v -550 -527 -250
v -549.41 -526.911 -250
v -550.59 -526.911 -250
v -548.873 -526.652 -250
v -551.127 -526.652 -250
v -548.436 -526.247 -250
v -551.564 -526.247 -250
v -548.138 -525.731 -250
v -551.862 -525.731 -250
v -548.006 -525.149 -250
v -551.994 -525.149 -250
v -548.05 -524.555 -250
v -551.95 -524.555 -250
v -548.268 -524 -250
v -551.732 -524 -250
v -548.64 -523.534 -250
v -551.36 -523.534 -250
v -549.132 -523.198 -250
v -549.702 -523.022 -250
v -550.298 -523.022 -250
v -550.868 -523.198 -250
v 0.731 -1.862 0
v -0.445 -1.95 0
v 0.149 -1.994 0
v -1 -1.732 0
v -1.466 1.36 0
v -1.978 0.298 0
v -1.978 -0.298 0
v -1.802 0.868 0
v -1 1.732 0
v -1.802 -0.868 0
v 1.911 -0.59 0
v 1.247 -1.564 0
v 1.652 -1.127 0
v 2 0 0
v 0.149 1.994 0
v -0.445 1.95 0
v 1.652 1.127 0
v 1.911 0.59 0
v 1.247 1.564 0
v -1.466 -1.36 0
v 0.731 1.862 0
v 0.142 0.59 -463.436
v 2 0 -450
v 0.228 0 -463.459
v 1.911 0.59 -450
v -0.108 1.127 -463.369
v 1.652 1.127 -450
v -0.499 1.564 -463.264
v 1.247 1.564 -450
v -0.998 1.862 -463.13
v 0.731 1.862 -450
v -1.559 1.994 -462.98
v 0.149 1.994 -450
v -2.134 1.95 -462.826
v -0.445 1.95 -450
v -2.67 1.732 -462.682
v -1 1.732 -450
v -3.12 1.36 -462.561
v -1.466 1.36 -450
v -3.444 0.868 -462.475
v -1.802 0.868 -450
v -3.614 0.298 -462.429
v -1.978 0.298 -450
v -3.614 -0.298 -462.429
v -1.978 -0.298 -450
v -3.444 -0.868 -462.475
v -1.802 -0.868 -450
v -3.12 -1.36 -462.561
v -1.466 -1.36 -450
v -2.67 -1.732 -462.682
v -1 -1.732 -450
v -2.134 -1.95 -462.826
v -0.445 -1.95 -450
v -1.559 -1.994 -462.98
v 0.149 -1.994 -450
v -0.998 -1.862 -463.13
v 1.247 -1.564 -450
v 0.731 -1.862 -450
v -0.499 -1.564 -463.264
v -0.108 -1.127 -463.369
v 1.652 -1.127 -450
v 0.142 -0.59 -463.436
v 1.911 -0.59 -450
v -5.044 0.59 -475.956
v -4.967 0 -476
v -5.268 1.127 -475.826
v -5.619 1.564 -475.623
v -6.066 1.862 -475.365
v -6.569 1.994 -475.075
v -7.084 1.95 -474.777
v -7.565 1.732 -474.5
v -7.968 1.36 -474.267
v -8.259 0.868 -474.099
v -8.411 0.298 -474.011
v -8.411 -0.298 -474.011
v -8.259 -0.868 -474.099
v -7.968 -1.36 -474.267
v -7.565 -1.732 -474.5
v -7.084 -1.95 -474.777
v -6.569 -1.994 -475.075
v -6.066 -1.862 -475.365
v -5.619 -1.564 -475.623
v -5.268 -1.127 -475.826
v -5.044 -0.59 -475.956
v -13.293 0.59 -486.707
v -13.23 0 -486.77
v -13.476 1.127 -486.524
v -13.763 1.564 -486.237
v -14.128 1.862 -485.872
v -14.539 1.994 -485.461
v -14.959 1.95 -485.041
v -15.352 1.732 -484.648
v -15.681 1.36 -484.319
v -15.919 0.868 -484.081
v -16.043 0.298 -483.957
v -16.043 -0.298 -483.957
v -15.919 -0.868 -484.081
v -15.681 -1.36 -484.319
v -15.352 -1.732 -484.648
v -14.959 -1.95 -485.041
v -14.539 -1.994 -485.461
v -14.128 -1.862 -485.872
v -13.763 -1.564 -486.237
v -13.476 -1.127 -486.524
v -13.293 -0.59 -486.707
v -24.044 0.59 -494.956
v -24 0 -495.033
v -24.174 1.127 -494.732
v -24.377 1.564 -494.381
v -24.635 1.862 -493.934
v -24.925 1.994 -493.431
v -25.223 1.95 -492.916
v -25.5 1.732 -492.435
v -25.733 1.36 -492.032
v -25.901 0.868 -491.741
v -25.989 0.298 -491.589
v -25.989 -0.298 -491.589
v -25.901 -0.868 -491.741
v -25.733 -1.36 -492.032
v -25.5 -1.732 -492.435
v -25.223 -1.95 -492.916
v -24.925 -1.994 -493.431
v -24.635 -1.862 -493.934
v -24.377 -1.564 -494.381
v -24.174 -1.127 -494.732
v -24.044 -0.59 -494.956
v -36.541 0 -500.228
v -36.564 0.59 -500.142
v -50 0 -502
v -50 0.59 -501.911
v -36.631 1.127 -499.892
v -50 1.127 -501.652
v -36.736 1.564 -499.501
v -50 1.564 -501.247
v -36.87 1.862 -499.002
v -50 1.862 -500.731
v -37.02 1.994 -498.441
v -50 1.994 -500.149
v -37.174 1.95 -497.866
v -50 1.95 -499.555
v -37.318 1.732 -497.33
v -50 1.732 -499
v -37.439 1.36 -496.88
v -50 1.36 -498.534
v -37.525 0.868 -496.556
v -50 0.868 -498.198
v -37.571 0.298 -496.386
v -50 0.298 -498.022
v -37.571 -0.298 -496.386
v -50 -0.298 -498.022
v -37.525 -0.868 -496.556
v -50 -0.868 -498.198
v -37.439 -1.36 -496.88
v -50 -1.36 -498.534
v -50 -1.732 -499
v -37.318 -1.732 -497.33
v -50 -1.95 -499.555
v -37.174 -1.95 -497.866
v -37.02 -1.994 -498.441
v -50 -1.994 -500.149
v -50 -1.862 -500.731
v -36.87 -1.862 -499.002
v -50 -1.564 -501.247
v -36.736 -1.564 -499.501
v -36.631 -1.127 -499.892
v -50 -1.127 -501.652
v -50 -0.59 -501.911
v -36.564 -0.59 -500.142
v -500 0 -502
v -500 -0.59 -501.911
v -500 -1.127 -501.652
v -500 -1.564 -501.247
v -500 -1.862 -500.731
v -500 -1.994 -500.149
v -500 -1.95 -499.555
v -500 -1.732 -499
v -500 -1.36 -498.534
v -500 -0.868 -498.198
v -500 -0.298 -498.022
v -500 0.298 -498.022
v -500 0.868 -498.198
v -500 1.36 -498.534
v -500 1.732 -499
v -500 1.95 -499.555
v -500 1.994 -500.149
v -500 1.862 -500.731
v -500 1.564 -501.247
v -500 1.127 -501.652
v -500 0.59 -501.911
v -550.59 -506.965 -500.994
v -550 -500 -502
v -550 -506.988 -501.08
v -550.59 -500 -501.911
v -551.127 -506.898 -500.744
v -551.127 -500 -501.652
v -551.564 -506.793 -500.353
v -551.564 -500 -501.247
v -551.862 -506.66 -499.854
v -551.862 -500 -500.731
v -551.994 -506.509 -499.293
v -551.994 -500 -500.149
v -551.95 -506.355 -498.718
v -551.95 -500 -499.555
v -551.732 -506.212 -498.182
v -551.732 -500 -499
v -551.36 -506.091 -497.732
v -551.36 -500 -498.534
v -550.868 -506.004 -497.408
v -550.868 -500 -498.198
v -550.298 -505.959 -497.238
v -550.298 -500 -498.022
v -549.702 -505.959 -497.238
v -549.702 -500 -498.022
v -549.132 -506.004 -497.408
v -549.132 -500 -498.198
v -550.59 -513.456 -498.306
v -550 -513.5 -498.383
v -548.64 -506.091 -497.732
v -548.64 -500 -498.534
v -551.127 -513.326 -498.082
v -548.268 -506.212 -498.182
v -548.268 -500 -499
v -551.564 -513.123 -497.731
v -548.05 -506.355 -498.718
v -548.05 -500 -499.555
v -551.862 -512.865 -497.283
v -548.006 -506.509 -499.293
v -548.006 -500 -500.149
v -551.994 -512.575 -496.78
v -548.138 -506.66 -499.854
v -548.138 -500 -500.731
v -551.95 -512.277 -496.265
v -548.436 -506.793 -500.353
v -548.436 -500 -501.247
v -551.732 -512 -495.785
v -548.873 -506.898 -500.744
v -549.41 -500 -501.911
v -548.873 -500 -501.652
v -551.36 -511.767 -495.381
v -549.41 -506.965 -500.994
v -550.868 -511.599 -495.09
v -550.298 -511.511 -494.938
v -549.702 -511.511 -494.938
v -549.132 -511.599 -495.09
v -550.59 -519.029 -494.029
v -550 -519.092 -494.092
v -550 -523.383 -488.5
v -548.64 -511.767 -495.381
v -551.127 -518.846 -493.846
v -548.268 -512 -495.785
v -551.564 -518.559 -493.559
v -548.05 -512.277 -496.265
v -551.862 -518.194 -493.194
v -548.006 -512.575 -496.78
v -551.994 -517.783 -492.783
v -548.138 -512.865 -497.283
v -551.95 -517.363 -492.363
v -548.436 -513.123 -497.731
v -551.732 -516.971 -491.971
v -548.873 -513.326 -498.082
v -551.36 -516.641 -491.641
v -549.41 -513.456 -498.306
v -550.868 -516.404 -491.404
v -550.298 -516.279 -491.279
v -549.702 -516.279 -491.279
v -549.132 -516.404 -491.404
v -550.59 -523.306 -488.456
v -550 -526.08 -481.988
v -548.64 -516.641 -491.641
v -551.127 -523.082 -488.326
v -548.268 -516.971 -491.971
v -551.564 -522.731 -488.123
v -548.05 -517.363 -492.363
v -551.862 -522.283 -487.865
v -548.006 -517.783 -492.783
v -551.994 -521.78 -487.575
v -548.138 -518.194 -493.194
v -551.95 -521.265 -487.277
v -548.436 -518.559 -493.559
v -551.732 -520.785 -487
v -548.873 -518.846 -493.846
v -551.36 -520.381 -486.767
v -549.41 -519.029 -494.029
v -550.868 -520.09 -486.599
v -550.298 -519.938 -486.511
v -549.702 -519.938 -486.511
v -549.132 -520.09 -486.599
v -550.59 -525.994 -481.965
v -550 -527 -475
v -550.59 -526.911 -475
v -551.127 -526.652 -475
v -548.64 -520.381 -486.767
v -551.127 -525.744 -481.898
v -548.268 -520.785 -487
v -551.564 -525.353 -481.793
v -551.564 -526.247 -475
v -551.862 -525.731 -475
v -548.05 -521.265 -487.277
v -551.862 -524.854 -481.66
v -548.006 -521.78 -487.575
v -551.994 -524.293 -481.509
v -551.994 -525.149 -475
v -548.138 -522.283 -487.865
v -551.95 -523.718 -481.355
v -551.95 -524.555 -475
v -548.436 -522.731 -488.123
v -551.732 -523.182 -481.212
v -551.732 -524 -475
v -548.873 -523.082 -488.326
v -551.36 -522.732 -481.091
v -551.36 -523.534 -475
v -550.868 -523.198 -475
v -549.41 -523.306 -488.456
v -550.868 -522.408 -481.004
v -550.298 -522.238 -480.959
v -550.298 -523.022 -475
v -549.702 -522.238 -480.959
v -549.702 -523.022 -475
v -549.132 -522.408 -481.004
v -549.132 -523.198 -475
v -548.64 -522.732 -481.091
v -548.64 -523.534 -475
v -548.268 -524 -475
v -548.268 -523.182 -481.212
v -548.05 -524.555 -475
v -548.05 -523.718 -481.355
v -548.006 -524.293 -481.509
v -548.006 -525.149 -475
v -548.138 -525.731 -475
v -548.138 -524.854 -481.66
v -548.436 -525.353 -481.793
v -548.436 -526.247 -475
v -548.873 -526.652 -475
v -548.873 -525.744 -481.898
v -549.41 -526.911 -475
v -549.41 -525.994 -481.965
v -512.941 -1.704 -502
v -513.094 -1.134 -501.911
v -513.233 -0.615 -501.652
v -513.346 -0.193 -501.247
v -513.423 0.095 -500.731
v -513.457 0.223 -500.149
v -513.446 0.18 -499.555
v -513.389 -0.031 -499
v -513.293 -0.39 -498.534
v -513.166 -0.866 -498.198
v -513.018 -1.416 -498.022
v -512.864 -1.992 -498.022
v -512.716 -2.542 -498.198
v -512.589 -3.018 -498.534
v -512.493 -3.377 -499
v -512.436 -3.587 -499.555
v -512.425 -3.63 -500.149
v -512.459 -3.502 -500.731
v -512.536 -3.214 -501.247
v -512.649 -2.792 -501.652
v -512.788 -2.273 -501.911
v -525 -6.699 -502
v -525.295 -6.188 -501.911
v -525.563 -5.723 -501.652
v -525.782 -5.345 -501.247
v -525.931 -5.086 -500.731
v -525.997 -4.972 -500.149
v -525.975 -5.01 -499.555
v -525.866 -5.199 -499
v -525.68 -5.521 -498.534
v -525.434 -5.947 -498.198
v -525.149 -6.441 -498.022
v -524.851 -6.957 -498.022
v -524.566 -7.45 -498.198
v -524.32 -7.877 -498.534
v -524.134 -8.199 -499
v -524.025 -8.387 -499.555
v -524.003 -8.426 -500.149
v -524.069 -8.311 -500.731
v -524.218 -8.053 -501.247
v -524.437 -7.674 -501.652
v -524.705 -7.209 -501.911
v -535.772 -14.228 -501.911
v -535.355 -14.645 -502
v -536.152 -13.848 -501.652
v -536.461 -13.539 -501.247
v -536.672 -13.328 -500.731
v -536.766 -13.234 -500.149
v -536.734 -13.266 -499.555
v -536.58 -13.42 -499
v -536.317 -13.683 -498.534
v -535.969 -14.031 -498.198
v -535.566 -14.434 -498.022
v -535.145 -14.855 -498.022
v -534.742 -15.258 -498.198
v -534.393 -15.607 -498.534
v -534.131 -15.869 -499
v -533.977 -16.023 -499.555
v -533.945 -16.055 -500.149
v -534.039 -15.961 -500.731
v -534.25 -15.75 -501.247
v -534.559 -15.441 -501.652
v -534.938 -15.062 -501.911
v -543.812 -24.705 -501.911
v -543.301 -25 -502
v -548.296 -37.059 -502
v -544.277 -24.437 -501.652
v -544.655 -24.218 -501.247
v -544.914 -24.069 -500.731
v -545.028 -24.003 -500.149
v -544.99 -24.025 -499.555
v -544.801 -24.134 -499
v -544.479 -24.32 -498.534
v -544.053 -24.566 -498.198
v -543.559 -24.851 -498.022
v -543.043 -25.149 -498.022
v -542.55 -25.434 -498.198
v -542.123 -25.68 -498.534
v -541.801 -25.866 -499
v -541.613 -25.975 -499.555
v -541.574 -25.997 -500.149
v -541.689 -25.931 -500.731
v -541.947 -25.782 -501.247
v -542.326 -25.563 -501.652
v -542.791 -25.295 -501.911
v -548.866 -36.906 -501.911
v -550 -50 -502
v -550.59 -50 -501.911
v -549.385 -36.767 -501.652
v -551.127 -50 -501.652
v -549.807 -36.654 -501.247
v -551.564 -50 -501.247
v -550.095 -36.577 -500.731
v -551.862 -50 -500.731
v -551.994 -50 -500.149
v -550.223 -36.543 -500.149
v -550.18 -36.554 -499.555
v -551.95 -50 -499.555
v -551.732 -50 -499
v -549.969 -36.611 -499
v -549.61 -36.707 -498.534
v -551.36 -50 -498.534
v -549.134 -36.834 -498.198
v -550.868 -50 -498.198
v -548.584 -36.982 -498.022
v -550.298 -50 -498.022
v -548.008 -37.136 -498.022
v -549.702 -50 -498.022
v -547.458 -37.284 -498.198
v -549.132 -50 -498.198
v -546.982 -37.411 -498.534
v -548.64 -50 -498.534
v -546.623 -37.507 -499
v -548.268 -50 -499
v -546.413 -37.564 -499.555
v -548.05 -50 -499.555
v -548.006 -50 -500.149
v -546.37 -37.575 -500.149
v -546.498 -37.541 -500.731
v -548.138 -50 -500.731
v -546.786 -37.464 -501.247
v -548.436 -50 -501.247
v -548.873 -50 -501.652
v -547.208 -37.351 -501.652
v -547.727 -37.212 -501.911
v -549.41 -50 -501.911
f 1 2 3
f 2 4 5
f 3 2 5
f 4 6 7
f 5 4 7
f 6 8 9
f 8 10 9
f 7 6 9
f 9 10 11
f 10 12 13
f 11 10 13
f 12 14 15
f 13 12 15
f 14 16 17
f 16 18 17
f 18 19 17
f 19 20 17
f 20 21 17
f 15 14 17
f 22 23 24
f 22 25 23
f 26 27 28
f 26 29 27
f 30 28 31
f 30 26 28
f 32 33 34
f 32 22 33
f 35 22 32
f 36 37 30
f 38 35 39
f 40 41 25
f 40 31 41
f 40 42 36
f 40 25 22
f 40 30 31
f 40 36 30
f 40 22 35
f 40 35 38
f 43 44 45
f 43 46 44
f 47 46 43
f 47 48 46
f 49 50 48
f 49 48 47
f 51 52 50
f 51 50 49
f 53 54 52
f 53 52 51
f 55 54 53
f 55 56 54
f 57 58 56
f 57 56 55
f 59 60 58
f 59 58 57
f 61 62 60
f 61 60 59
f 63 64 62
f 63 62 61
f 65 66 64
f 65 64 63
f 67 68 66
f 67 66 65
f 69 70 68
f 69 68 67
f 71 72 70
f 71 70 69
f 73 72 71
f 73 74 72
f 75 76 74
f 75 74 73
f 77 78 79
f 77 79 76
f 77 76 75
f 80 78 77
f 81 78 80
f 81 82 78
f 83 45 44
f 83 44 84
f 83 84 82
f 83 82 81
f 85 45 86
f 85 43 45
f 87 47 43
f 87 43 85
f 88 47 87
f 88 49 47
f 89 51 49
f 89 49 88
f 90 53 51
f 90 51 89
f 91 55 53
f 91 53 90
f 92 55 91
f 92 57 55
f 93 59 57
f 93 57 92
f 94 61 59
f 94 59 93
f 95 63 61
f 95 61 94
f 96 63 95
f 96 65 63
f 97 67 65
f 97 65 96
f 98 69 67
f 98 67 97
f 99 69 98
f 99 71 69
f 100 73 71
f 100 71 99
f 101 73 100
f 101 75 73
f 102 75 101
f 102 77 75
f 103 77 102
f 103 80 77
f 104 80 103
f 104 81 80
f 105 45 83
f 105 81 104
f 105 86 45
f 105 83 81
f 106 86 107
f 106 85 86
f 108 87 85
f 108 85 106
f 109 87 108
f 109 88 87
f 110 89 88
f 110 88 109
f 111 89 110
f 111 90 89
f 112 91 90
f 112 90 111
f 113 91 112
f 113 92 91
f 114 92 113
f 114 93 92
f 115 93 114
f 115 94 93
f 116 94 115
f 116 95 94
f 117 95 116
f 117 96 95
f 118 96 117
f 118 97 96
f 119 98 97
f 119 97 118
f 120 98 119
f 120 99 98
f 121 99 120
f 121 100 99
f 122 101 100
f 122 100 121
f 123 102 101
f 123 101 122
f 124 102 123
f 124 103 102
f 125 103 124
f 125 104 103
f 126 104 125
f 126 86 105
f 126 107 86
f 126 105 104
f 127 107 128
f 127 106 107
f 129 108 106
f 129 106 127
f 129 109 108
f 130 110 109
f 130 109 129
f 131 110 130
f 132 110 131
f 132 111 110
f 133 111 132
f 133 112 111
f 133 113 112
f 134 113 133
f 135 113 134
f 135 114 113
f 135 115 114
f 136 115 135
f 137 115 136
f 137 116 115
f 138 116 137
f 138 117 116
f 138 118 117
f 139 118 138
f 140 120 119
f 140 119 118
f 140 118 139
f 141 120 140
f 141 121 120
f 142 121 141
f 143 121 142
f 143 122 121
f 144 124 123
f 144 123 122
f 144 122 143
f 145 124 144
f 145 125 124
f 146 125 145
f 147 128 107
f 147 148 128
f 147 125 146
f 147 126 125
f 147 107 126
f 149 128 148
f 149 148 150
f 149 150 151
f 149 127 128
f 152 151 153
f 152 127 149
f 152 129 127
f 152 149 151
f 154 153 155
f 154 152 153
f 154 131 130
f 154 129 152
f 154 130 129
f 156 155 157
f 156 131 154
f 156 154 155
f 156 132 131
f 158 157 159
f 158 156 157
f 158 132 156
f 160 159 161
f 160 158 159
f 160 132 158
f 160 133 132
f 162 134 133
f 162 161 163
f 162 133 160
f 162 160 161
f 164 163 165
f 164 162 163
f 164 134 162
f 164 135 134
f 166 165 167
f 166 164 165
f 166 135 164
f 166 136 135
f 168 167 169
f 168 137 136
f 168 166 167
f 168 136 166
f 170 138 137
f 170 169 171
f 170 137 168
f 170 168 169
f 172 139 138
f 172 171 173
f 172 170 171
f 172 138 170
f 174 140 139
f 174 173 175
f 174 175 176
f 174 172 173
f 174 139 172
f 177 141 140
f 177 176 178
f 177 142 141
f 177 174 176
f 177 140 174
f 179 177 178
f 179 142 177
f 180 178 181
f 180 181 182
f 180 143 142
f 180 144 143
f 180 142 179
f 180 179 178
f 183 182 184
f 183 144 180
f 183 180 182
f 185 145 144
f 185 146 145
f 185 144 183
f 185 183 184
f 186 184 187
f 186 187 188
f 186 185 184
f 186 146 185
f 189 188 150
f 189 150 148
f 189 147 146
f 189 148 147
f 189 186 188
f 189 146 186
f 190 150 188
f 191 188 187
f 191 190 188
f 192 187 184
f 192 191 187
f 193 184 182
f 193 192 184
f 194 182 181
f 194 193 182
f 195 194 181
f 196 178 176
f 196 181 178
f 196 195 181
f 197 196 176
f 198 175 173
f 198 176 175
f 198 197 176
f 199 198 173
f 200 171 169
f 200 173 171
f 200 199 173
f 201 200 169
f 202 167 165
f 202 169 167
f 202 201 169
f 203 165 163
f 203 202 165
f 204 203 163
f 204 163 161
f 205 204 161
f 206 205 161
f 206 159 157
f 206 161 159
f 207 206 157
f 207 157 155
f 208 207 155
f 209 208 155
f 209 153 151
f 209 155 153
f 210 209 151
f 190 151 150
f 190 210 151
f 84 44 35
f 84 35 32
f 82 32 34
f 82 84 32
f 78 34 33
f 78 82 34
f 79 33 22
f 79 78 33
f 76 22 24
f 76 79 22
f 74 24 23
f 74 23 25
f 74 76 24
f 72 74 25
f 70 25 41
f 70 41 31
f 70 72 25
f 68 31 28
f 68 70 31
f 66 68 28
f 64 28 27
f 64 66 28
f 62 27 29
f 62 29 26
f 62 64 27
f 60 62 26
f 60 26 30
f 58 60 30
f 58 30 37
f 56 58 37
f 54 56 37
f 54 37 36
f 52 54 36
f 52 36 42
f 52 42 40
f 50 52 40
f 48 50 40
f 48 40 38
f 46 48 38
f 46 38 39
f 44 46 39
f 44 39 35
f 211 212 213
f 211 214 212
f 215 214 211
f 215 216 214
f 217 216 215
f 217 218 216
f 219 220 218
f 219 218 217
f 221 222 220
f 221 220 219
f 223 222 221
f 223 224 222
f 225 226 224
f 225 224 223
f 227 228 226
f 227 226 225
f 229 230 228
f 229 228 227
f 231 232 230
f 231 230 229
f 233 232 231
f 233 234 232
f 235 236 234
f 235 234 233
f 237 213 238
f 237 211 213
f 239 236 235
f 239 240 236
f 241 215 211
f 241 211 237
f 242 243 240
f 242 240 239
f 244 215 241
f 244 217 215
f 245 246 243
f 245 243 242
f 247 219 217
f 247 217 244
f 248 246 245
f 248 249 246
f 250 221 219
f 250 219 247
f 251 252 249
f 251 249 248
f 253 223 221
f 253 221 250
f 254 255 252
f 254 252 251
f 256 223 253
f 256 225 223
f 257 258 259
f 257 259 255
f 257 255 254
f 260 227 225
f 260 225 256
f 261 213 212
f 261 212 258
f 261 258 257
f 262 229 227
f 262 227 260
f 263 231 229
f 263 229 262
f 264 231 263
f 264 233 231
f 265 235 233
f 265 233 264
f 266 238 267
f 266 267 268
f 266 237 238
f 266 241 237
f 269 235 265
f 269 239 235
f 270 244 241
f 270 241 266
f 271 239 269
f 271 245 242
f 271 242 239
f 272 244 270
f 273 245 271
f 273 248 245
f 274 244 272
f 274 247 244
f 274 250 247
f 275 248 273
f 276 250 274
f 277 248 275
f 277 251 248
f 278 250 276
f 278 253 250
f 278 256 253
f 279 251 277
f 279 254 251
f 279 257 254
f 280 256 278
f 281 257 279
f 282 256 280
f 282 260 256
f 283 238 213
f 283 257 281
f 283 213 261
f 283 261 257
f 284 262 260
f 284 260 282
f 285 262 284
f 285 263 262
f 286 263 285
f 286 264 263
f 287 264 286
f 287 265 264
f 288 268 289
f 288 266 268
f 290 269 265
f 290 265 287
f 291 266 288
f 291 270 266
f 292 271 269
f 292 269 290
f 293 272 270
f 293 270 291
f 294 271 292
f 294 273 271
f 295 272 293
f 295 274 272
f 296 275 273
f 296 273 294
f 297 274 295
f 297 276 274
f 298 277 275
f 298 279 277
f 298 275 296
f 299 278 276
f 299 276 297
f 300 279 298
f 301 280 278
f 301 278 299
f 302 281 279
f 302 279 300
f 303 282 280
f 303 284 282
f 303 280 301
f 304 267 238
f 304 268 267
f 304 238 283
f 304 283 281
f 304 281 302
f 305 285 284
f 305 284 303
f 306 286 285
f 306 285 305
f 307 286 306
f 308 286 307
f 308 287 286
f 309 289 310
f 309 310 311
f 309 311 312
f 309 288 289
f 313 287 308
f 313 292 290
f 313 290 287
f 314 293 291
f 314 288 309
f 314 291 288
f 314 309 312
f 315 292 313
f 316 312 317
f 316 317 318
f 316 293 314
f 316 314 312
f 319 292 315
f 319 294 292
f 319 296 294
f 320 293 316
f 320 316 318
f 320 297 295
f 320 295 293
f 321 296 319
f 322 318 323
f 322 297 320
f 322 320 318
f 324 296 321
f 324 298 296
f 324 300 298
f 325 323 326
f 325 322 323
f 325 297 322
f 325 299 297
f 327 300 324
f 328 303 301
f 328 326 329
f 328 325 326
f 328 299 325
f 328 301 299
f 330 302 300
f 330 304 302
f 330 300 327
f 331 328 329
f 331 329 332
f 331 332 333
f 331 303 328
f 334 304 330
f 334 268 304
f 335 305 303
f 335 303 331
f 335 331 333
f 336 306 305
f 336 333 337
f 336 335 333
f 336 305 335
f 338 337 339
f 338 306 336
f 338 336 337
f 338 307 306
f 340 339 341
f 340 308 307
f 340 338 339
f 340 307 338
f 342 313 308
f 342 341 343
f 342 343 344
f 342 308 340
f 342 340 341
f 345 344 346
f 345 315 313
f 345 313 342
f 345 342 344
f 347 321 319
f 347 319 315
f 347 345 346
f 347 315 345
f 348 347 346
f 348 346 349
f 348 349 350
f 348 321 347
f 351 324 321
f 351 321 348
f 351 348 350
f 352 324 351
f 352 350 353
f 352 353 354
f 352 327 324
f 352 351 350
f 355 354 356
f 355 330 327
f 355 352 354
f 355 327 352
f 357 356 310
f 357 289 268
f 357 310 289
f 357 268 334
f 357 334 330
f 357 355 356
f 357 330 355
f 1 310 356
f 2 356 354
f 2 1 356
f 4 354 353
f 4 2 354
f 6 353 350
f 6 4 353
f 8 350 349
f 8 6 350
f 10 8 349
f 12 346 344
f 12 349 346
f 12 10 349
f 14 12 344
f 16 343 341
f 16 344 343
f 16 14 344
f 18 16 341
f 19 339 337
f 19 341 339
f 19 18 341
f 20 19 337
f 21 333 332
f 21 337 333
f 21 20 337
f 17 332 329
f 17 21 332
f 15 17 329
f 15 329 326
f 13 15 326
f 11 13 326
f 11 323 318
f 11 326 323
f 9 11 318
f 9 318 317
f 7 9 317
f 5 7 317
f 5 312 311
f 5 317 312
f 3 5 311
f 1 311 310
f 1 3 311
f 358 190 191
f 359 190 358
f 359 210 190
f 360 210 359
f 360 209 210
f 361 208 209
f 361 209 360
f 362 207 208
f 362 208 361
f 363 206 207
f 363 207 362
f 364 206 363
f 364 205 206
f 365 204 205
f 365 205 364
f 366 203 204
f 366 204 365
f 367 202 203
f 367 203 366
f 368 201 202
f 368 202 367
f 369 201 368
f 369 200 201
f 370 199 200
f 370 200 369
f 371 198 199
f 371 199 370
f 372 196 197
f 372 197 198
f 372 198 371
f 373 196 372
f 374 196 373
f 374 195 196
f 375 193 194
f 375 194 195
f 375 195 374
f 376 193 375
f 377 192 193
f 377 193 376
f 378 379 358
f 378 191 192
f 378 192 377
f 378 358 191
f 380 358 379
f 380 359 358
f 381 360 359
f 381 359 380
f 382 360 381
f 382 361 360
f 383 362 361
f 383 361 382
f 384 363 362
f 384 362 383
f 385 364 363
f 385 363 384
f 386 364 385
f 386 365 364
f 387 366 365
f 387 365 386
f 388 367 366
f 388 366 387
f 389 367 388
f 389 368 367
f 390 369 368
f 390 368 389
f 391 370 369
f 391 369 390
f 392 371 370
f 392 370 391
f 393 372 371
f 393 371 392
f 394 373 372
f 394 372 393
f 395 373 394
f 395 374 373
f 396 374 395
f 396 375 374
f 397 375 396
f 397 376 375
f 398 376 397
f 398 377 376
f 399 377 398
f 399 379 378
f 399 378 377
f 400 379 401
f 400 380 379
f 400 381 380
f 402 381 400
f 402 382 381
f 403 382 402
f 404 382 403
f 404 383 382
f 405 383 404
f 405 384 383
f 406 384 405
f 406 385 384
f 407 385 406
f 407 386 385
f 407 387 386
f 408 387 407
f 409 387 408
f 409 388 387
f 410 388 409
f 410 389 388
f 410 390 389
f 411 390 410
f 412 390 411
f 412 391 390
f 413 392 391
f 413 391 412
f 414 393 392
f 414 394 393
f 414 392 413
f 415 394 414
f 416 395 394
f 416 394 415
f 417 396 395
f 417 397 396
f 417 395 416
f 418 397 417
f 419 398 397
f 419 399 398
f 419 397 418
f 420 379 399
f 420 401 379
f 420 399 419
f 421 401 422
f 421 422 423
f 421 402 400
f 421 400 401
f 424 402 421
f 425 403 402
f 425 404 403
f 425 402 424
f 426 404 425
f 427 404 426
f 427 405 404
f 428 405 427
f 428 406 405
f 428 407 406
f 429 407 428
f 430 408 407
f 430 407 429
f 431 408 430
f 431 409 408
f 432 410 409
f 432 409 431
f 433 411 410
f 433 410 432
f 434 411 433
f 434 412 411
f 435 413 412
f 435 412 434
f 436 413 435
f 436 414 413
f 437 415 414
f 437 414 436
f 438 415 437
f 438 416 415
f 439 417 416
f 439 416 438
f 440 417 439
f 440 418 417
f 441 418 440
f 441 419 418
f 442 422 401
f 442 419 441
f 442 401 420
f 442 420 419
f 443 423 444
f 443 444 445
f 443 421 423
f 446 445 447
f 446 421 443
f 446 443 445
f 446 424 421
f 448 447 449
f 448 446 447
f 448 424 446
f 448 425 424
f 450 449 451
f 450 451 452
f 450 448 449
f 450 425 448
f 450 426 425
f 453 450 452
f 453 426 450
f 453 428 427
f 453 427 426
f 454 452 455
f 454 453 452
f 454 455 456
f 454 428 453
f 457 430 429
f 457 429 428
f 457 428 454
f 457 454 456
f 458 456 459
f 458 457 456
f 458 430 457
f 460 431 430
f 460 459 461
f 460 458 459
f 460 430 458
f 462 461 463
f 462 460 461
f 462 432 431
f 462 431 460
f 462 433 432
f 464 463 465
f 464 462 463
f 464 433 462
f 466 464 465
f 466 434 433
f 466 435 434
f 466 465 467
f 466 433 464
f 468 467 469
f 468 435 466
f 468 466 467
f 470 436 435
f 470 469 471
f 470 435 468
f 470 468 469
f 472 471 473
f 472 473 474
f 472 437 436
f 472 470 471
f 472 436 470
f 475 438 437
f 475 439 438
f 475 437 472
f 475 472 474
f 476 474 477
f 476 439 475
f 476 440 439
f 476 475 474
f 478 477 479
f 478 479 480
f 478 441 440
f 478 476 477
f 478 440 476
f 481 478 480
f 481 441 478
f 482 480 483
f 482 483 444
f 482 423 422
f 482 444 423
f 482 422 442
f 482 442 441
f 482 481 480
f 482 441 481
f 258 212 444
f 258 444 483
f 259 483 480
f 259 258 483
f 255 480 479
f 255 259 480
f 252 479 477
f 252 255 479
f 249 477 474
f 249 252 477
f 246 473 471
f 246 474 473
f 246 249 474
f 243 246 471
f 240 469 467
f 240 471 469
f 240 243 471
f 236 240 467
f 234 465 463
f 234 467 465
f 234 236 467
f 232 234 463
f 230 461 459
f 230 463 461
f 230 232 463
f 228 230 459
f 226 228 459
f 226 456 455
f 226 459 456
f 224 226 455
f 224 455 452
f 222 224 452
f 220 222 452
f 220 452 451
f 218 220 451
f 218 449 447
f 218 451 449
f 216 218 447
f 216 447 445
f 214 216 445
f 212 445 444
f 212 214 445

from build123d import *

# Parameters (mm, degrees)
SKETCH1_R = 2


with BuildPart() as part:
    # Sweep1: sweep along a curve in space
    with BuildLine() as sweep1_path:
        Line((0, 0, 0), (0, 0, -450))
        ThreePointArc((0, 0, -450), (-14.644660941, 0, -485.355339059), (-50, 0, -500))
        Line((-50, 0, -500), (-500, 0, -500))
        ThreePointArc((-500, 0, -500), (-535.355339059, -14.644660941, -500), (-550, -50, -500))
        Line((-550, -50, -500), (-550, -500, -500))
        ThreePointArc((-550, -525, -475), (-550, -517.67766953, -492.67766953), (-550, -500, -500))
        Line((-550, -525, -475), (-550, -525, -250))
    # Sketch1 → Sweep1 (sweep)
    with BuildSketch(Plane.XY):
        Circle(SKETCH1_R)
    sweep(path=sweep1_path.line)


solid = part.part
